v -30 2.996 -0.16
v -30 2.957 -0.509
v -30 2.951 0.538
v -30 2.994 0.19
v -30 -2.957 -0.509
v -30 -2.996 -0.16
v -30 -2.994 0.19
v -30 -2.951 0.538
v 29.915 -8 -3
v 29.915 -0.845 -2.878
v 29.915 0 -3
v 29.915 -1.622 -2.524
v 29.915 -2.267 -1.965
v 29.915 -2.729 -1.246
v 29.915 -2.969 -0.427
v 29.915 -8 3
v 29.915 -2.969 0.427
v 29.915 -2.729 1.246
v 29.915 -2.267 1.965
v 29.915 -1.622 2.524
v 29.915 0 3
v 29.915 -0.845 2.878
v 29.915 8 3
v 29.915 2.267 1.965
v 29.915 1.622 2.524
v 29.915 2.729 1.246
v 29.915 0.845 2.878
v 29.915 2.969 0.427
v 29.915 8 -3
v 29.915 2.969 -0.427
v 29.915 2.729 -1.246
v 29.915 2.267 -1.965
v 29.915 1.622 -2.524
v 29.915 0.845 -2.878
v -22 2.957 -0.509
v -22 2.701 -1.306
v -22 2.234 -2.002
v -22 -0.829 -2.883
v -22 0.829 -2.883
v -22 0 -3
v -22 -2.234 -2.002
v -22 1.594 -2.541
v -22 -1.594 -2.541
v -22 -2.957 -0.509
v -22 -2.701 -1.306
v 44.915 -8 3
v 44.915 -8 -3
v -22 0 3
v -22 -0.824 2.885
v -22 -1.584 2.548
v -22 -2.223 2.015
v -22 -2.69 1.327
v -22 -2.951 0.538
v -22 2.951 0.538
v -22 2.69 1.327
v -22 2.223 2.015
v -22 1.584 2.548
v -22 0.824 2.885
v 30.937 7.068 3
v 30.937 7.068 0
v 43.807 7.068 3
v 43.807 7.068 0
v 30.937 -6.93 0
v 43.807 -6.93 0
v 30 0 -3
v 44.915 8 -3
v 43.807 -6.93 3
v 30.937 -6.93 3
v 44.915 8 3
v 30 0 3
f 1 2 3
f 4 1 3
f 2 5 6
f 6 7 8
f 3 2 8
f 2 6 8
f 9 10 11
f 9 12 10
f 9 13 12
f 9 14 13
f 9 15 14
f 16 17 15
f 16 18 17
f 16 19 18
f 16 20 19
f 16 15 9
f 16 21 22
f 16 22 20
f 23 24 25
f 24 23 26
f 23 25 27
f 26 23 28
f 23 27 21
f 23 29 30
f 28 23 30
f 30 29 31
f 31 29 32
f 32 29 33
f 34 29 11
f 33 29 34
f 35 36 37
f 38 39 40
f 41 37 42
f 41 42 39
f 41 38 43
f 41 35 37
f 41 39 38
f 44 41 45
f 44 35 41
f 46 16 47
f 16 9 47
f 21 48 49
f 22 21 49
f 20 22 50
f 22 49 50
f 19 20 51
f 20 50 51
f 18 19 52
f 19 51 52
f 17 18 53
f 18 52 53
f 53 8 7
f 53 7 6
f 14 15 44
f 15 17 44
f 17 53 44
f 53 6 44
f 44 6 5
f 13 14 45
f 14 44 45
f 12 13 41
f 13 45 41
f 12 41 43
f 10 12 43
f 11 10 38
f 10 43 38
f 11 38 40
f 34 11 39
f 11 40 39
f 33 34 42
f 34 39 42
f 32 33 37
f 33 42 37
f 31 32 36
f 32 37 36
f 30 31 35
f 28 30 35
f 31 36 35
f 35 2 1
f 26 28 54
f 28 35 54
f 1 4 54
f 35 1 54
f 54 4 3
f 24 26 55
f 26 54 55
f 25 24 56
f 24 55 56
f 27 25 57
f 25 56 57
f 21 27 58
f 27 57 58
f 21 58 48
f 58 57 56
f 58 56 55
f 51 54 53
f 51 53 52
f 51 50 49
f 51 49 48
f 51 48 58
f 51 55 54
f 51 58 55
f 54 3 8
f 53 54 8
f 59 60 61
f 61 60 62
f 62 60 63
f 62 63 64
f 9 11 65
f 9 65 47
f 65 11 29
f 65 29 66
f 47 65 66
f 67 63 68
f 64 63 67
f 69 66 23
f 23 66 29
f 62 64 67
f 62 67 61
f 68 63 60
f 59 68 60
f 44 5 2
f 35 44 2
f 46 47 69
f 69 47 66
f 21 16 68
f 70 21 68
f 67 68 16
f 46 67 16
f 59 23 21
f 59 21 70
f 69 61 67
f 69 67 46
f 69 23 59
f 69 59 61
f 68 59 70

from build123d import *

# Parameters (mm, degrees)
F3_DEPTH = 8
F4_W     = 12.8698311746
F4_H     = 13.9981461689
F5_DEPTH = 3
F6_DEPTH = 3


with BuildPart() as f1:
    # F0 (on Front) → F1 (revolve)
    with BuildSketch(Plane.XZ):
        Polygon((30, 3), (0, 3), (-30, 3), (-30, 0), (0, 0), (30, 0), align=None)
    revolve(axis=Axis((15, 0, 0), (1, 0, 0)))

    # F2 (on face) → F3 (cut)
    with BuildSketch(Plane(origin=(-30, 0, 0), x_dir=(0, -1, 0), z_dir=(-1, 0, 0))):
        with BuildLine():
            Line((3.0024852457, -0.5085919919), (-3.0024852457, -0.5085919919))
            ThreePointArc((-3.0024852457, -0.5085919919), (0, -3.0452558948), (3.0024852457, -0.5085919919))
        make_face()
        with BuildLine():
            ThreePointArc((2.9974451145, 0.5375), (0, 3.0452558948), (-2.9974451145, 0.5375))
            Line((-2.9974451145, 0.5375), (2.9974451145, 0.5375))
        make_face()
    extrude(amount=-F3_DEPTH, mode=Mode.SUBTRACT)

    # F4 (on Top) → F5 (join)
    with BuildSketch(Plane.XY):
        Polygon((29.9149005125, 8), (29.9149005125, 0), (29.9149005125, -8), (44.9149005125, -8), (44.9149005125, 8), align=None)
        with Locations((37.3716000468, 0.0690473244)):
            Rectangle(F4_W, F4_H, mode=Mode.SUBTRACT)
        with Locations((37.3716000468, 0.0690473244)):
            Rectangle(F4_W, F4_H)
    extrude(amount=-F5_DEPTH)

    # F4 (on Top) → F6 (join)
    with BuildSketch(Plane.XY):
        Polygon((29.9149005125, 8), (29.9149005125, 0), (29.9149005125, -8), (44.9149005125, -8), (44.9149005125, 8), align=None)
        with Locations((37.3716000468, 0.0690473244)):
            Rectangle(F4_W, F4_H, mode=Mode.SUBTRACT)
    extrude(amount=F6_DEPTH)


solid = f1.part
